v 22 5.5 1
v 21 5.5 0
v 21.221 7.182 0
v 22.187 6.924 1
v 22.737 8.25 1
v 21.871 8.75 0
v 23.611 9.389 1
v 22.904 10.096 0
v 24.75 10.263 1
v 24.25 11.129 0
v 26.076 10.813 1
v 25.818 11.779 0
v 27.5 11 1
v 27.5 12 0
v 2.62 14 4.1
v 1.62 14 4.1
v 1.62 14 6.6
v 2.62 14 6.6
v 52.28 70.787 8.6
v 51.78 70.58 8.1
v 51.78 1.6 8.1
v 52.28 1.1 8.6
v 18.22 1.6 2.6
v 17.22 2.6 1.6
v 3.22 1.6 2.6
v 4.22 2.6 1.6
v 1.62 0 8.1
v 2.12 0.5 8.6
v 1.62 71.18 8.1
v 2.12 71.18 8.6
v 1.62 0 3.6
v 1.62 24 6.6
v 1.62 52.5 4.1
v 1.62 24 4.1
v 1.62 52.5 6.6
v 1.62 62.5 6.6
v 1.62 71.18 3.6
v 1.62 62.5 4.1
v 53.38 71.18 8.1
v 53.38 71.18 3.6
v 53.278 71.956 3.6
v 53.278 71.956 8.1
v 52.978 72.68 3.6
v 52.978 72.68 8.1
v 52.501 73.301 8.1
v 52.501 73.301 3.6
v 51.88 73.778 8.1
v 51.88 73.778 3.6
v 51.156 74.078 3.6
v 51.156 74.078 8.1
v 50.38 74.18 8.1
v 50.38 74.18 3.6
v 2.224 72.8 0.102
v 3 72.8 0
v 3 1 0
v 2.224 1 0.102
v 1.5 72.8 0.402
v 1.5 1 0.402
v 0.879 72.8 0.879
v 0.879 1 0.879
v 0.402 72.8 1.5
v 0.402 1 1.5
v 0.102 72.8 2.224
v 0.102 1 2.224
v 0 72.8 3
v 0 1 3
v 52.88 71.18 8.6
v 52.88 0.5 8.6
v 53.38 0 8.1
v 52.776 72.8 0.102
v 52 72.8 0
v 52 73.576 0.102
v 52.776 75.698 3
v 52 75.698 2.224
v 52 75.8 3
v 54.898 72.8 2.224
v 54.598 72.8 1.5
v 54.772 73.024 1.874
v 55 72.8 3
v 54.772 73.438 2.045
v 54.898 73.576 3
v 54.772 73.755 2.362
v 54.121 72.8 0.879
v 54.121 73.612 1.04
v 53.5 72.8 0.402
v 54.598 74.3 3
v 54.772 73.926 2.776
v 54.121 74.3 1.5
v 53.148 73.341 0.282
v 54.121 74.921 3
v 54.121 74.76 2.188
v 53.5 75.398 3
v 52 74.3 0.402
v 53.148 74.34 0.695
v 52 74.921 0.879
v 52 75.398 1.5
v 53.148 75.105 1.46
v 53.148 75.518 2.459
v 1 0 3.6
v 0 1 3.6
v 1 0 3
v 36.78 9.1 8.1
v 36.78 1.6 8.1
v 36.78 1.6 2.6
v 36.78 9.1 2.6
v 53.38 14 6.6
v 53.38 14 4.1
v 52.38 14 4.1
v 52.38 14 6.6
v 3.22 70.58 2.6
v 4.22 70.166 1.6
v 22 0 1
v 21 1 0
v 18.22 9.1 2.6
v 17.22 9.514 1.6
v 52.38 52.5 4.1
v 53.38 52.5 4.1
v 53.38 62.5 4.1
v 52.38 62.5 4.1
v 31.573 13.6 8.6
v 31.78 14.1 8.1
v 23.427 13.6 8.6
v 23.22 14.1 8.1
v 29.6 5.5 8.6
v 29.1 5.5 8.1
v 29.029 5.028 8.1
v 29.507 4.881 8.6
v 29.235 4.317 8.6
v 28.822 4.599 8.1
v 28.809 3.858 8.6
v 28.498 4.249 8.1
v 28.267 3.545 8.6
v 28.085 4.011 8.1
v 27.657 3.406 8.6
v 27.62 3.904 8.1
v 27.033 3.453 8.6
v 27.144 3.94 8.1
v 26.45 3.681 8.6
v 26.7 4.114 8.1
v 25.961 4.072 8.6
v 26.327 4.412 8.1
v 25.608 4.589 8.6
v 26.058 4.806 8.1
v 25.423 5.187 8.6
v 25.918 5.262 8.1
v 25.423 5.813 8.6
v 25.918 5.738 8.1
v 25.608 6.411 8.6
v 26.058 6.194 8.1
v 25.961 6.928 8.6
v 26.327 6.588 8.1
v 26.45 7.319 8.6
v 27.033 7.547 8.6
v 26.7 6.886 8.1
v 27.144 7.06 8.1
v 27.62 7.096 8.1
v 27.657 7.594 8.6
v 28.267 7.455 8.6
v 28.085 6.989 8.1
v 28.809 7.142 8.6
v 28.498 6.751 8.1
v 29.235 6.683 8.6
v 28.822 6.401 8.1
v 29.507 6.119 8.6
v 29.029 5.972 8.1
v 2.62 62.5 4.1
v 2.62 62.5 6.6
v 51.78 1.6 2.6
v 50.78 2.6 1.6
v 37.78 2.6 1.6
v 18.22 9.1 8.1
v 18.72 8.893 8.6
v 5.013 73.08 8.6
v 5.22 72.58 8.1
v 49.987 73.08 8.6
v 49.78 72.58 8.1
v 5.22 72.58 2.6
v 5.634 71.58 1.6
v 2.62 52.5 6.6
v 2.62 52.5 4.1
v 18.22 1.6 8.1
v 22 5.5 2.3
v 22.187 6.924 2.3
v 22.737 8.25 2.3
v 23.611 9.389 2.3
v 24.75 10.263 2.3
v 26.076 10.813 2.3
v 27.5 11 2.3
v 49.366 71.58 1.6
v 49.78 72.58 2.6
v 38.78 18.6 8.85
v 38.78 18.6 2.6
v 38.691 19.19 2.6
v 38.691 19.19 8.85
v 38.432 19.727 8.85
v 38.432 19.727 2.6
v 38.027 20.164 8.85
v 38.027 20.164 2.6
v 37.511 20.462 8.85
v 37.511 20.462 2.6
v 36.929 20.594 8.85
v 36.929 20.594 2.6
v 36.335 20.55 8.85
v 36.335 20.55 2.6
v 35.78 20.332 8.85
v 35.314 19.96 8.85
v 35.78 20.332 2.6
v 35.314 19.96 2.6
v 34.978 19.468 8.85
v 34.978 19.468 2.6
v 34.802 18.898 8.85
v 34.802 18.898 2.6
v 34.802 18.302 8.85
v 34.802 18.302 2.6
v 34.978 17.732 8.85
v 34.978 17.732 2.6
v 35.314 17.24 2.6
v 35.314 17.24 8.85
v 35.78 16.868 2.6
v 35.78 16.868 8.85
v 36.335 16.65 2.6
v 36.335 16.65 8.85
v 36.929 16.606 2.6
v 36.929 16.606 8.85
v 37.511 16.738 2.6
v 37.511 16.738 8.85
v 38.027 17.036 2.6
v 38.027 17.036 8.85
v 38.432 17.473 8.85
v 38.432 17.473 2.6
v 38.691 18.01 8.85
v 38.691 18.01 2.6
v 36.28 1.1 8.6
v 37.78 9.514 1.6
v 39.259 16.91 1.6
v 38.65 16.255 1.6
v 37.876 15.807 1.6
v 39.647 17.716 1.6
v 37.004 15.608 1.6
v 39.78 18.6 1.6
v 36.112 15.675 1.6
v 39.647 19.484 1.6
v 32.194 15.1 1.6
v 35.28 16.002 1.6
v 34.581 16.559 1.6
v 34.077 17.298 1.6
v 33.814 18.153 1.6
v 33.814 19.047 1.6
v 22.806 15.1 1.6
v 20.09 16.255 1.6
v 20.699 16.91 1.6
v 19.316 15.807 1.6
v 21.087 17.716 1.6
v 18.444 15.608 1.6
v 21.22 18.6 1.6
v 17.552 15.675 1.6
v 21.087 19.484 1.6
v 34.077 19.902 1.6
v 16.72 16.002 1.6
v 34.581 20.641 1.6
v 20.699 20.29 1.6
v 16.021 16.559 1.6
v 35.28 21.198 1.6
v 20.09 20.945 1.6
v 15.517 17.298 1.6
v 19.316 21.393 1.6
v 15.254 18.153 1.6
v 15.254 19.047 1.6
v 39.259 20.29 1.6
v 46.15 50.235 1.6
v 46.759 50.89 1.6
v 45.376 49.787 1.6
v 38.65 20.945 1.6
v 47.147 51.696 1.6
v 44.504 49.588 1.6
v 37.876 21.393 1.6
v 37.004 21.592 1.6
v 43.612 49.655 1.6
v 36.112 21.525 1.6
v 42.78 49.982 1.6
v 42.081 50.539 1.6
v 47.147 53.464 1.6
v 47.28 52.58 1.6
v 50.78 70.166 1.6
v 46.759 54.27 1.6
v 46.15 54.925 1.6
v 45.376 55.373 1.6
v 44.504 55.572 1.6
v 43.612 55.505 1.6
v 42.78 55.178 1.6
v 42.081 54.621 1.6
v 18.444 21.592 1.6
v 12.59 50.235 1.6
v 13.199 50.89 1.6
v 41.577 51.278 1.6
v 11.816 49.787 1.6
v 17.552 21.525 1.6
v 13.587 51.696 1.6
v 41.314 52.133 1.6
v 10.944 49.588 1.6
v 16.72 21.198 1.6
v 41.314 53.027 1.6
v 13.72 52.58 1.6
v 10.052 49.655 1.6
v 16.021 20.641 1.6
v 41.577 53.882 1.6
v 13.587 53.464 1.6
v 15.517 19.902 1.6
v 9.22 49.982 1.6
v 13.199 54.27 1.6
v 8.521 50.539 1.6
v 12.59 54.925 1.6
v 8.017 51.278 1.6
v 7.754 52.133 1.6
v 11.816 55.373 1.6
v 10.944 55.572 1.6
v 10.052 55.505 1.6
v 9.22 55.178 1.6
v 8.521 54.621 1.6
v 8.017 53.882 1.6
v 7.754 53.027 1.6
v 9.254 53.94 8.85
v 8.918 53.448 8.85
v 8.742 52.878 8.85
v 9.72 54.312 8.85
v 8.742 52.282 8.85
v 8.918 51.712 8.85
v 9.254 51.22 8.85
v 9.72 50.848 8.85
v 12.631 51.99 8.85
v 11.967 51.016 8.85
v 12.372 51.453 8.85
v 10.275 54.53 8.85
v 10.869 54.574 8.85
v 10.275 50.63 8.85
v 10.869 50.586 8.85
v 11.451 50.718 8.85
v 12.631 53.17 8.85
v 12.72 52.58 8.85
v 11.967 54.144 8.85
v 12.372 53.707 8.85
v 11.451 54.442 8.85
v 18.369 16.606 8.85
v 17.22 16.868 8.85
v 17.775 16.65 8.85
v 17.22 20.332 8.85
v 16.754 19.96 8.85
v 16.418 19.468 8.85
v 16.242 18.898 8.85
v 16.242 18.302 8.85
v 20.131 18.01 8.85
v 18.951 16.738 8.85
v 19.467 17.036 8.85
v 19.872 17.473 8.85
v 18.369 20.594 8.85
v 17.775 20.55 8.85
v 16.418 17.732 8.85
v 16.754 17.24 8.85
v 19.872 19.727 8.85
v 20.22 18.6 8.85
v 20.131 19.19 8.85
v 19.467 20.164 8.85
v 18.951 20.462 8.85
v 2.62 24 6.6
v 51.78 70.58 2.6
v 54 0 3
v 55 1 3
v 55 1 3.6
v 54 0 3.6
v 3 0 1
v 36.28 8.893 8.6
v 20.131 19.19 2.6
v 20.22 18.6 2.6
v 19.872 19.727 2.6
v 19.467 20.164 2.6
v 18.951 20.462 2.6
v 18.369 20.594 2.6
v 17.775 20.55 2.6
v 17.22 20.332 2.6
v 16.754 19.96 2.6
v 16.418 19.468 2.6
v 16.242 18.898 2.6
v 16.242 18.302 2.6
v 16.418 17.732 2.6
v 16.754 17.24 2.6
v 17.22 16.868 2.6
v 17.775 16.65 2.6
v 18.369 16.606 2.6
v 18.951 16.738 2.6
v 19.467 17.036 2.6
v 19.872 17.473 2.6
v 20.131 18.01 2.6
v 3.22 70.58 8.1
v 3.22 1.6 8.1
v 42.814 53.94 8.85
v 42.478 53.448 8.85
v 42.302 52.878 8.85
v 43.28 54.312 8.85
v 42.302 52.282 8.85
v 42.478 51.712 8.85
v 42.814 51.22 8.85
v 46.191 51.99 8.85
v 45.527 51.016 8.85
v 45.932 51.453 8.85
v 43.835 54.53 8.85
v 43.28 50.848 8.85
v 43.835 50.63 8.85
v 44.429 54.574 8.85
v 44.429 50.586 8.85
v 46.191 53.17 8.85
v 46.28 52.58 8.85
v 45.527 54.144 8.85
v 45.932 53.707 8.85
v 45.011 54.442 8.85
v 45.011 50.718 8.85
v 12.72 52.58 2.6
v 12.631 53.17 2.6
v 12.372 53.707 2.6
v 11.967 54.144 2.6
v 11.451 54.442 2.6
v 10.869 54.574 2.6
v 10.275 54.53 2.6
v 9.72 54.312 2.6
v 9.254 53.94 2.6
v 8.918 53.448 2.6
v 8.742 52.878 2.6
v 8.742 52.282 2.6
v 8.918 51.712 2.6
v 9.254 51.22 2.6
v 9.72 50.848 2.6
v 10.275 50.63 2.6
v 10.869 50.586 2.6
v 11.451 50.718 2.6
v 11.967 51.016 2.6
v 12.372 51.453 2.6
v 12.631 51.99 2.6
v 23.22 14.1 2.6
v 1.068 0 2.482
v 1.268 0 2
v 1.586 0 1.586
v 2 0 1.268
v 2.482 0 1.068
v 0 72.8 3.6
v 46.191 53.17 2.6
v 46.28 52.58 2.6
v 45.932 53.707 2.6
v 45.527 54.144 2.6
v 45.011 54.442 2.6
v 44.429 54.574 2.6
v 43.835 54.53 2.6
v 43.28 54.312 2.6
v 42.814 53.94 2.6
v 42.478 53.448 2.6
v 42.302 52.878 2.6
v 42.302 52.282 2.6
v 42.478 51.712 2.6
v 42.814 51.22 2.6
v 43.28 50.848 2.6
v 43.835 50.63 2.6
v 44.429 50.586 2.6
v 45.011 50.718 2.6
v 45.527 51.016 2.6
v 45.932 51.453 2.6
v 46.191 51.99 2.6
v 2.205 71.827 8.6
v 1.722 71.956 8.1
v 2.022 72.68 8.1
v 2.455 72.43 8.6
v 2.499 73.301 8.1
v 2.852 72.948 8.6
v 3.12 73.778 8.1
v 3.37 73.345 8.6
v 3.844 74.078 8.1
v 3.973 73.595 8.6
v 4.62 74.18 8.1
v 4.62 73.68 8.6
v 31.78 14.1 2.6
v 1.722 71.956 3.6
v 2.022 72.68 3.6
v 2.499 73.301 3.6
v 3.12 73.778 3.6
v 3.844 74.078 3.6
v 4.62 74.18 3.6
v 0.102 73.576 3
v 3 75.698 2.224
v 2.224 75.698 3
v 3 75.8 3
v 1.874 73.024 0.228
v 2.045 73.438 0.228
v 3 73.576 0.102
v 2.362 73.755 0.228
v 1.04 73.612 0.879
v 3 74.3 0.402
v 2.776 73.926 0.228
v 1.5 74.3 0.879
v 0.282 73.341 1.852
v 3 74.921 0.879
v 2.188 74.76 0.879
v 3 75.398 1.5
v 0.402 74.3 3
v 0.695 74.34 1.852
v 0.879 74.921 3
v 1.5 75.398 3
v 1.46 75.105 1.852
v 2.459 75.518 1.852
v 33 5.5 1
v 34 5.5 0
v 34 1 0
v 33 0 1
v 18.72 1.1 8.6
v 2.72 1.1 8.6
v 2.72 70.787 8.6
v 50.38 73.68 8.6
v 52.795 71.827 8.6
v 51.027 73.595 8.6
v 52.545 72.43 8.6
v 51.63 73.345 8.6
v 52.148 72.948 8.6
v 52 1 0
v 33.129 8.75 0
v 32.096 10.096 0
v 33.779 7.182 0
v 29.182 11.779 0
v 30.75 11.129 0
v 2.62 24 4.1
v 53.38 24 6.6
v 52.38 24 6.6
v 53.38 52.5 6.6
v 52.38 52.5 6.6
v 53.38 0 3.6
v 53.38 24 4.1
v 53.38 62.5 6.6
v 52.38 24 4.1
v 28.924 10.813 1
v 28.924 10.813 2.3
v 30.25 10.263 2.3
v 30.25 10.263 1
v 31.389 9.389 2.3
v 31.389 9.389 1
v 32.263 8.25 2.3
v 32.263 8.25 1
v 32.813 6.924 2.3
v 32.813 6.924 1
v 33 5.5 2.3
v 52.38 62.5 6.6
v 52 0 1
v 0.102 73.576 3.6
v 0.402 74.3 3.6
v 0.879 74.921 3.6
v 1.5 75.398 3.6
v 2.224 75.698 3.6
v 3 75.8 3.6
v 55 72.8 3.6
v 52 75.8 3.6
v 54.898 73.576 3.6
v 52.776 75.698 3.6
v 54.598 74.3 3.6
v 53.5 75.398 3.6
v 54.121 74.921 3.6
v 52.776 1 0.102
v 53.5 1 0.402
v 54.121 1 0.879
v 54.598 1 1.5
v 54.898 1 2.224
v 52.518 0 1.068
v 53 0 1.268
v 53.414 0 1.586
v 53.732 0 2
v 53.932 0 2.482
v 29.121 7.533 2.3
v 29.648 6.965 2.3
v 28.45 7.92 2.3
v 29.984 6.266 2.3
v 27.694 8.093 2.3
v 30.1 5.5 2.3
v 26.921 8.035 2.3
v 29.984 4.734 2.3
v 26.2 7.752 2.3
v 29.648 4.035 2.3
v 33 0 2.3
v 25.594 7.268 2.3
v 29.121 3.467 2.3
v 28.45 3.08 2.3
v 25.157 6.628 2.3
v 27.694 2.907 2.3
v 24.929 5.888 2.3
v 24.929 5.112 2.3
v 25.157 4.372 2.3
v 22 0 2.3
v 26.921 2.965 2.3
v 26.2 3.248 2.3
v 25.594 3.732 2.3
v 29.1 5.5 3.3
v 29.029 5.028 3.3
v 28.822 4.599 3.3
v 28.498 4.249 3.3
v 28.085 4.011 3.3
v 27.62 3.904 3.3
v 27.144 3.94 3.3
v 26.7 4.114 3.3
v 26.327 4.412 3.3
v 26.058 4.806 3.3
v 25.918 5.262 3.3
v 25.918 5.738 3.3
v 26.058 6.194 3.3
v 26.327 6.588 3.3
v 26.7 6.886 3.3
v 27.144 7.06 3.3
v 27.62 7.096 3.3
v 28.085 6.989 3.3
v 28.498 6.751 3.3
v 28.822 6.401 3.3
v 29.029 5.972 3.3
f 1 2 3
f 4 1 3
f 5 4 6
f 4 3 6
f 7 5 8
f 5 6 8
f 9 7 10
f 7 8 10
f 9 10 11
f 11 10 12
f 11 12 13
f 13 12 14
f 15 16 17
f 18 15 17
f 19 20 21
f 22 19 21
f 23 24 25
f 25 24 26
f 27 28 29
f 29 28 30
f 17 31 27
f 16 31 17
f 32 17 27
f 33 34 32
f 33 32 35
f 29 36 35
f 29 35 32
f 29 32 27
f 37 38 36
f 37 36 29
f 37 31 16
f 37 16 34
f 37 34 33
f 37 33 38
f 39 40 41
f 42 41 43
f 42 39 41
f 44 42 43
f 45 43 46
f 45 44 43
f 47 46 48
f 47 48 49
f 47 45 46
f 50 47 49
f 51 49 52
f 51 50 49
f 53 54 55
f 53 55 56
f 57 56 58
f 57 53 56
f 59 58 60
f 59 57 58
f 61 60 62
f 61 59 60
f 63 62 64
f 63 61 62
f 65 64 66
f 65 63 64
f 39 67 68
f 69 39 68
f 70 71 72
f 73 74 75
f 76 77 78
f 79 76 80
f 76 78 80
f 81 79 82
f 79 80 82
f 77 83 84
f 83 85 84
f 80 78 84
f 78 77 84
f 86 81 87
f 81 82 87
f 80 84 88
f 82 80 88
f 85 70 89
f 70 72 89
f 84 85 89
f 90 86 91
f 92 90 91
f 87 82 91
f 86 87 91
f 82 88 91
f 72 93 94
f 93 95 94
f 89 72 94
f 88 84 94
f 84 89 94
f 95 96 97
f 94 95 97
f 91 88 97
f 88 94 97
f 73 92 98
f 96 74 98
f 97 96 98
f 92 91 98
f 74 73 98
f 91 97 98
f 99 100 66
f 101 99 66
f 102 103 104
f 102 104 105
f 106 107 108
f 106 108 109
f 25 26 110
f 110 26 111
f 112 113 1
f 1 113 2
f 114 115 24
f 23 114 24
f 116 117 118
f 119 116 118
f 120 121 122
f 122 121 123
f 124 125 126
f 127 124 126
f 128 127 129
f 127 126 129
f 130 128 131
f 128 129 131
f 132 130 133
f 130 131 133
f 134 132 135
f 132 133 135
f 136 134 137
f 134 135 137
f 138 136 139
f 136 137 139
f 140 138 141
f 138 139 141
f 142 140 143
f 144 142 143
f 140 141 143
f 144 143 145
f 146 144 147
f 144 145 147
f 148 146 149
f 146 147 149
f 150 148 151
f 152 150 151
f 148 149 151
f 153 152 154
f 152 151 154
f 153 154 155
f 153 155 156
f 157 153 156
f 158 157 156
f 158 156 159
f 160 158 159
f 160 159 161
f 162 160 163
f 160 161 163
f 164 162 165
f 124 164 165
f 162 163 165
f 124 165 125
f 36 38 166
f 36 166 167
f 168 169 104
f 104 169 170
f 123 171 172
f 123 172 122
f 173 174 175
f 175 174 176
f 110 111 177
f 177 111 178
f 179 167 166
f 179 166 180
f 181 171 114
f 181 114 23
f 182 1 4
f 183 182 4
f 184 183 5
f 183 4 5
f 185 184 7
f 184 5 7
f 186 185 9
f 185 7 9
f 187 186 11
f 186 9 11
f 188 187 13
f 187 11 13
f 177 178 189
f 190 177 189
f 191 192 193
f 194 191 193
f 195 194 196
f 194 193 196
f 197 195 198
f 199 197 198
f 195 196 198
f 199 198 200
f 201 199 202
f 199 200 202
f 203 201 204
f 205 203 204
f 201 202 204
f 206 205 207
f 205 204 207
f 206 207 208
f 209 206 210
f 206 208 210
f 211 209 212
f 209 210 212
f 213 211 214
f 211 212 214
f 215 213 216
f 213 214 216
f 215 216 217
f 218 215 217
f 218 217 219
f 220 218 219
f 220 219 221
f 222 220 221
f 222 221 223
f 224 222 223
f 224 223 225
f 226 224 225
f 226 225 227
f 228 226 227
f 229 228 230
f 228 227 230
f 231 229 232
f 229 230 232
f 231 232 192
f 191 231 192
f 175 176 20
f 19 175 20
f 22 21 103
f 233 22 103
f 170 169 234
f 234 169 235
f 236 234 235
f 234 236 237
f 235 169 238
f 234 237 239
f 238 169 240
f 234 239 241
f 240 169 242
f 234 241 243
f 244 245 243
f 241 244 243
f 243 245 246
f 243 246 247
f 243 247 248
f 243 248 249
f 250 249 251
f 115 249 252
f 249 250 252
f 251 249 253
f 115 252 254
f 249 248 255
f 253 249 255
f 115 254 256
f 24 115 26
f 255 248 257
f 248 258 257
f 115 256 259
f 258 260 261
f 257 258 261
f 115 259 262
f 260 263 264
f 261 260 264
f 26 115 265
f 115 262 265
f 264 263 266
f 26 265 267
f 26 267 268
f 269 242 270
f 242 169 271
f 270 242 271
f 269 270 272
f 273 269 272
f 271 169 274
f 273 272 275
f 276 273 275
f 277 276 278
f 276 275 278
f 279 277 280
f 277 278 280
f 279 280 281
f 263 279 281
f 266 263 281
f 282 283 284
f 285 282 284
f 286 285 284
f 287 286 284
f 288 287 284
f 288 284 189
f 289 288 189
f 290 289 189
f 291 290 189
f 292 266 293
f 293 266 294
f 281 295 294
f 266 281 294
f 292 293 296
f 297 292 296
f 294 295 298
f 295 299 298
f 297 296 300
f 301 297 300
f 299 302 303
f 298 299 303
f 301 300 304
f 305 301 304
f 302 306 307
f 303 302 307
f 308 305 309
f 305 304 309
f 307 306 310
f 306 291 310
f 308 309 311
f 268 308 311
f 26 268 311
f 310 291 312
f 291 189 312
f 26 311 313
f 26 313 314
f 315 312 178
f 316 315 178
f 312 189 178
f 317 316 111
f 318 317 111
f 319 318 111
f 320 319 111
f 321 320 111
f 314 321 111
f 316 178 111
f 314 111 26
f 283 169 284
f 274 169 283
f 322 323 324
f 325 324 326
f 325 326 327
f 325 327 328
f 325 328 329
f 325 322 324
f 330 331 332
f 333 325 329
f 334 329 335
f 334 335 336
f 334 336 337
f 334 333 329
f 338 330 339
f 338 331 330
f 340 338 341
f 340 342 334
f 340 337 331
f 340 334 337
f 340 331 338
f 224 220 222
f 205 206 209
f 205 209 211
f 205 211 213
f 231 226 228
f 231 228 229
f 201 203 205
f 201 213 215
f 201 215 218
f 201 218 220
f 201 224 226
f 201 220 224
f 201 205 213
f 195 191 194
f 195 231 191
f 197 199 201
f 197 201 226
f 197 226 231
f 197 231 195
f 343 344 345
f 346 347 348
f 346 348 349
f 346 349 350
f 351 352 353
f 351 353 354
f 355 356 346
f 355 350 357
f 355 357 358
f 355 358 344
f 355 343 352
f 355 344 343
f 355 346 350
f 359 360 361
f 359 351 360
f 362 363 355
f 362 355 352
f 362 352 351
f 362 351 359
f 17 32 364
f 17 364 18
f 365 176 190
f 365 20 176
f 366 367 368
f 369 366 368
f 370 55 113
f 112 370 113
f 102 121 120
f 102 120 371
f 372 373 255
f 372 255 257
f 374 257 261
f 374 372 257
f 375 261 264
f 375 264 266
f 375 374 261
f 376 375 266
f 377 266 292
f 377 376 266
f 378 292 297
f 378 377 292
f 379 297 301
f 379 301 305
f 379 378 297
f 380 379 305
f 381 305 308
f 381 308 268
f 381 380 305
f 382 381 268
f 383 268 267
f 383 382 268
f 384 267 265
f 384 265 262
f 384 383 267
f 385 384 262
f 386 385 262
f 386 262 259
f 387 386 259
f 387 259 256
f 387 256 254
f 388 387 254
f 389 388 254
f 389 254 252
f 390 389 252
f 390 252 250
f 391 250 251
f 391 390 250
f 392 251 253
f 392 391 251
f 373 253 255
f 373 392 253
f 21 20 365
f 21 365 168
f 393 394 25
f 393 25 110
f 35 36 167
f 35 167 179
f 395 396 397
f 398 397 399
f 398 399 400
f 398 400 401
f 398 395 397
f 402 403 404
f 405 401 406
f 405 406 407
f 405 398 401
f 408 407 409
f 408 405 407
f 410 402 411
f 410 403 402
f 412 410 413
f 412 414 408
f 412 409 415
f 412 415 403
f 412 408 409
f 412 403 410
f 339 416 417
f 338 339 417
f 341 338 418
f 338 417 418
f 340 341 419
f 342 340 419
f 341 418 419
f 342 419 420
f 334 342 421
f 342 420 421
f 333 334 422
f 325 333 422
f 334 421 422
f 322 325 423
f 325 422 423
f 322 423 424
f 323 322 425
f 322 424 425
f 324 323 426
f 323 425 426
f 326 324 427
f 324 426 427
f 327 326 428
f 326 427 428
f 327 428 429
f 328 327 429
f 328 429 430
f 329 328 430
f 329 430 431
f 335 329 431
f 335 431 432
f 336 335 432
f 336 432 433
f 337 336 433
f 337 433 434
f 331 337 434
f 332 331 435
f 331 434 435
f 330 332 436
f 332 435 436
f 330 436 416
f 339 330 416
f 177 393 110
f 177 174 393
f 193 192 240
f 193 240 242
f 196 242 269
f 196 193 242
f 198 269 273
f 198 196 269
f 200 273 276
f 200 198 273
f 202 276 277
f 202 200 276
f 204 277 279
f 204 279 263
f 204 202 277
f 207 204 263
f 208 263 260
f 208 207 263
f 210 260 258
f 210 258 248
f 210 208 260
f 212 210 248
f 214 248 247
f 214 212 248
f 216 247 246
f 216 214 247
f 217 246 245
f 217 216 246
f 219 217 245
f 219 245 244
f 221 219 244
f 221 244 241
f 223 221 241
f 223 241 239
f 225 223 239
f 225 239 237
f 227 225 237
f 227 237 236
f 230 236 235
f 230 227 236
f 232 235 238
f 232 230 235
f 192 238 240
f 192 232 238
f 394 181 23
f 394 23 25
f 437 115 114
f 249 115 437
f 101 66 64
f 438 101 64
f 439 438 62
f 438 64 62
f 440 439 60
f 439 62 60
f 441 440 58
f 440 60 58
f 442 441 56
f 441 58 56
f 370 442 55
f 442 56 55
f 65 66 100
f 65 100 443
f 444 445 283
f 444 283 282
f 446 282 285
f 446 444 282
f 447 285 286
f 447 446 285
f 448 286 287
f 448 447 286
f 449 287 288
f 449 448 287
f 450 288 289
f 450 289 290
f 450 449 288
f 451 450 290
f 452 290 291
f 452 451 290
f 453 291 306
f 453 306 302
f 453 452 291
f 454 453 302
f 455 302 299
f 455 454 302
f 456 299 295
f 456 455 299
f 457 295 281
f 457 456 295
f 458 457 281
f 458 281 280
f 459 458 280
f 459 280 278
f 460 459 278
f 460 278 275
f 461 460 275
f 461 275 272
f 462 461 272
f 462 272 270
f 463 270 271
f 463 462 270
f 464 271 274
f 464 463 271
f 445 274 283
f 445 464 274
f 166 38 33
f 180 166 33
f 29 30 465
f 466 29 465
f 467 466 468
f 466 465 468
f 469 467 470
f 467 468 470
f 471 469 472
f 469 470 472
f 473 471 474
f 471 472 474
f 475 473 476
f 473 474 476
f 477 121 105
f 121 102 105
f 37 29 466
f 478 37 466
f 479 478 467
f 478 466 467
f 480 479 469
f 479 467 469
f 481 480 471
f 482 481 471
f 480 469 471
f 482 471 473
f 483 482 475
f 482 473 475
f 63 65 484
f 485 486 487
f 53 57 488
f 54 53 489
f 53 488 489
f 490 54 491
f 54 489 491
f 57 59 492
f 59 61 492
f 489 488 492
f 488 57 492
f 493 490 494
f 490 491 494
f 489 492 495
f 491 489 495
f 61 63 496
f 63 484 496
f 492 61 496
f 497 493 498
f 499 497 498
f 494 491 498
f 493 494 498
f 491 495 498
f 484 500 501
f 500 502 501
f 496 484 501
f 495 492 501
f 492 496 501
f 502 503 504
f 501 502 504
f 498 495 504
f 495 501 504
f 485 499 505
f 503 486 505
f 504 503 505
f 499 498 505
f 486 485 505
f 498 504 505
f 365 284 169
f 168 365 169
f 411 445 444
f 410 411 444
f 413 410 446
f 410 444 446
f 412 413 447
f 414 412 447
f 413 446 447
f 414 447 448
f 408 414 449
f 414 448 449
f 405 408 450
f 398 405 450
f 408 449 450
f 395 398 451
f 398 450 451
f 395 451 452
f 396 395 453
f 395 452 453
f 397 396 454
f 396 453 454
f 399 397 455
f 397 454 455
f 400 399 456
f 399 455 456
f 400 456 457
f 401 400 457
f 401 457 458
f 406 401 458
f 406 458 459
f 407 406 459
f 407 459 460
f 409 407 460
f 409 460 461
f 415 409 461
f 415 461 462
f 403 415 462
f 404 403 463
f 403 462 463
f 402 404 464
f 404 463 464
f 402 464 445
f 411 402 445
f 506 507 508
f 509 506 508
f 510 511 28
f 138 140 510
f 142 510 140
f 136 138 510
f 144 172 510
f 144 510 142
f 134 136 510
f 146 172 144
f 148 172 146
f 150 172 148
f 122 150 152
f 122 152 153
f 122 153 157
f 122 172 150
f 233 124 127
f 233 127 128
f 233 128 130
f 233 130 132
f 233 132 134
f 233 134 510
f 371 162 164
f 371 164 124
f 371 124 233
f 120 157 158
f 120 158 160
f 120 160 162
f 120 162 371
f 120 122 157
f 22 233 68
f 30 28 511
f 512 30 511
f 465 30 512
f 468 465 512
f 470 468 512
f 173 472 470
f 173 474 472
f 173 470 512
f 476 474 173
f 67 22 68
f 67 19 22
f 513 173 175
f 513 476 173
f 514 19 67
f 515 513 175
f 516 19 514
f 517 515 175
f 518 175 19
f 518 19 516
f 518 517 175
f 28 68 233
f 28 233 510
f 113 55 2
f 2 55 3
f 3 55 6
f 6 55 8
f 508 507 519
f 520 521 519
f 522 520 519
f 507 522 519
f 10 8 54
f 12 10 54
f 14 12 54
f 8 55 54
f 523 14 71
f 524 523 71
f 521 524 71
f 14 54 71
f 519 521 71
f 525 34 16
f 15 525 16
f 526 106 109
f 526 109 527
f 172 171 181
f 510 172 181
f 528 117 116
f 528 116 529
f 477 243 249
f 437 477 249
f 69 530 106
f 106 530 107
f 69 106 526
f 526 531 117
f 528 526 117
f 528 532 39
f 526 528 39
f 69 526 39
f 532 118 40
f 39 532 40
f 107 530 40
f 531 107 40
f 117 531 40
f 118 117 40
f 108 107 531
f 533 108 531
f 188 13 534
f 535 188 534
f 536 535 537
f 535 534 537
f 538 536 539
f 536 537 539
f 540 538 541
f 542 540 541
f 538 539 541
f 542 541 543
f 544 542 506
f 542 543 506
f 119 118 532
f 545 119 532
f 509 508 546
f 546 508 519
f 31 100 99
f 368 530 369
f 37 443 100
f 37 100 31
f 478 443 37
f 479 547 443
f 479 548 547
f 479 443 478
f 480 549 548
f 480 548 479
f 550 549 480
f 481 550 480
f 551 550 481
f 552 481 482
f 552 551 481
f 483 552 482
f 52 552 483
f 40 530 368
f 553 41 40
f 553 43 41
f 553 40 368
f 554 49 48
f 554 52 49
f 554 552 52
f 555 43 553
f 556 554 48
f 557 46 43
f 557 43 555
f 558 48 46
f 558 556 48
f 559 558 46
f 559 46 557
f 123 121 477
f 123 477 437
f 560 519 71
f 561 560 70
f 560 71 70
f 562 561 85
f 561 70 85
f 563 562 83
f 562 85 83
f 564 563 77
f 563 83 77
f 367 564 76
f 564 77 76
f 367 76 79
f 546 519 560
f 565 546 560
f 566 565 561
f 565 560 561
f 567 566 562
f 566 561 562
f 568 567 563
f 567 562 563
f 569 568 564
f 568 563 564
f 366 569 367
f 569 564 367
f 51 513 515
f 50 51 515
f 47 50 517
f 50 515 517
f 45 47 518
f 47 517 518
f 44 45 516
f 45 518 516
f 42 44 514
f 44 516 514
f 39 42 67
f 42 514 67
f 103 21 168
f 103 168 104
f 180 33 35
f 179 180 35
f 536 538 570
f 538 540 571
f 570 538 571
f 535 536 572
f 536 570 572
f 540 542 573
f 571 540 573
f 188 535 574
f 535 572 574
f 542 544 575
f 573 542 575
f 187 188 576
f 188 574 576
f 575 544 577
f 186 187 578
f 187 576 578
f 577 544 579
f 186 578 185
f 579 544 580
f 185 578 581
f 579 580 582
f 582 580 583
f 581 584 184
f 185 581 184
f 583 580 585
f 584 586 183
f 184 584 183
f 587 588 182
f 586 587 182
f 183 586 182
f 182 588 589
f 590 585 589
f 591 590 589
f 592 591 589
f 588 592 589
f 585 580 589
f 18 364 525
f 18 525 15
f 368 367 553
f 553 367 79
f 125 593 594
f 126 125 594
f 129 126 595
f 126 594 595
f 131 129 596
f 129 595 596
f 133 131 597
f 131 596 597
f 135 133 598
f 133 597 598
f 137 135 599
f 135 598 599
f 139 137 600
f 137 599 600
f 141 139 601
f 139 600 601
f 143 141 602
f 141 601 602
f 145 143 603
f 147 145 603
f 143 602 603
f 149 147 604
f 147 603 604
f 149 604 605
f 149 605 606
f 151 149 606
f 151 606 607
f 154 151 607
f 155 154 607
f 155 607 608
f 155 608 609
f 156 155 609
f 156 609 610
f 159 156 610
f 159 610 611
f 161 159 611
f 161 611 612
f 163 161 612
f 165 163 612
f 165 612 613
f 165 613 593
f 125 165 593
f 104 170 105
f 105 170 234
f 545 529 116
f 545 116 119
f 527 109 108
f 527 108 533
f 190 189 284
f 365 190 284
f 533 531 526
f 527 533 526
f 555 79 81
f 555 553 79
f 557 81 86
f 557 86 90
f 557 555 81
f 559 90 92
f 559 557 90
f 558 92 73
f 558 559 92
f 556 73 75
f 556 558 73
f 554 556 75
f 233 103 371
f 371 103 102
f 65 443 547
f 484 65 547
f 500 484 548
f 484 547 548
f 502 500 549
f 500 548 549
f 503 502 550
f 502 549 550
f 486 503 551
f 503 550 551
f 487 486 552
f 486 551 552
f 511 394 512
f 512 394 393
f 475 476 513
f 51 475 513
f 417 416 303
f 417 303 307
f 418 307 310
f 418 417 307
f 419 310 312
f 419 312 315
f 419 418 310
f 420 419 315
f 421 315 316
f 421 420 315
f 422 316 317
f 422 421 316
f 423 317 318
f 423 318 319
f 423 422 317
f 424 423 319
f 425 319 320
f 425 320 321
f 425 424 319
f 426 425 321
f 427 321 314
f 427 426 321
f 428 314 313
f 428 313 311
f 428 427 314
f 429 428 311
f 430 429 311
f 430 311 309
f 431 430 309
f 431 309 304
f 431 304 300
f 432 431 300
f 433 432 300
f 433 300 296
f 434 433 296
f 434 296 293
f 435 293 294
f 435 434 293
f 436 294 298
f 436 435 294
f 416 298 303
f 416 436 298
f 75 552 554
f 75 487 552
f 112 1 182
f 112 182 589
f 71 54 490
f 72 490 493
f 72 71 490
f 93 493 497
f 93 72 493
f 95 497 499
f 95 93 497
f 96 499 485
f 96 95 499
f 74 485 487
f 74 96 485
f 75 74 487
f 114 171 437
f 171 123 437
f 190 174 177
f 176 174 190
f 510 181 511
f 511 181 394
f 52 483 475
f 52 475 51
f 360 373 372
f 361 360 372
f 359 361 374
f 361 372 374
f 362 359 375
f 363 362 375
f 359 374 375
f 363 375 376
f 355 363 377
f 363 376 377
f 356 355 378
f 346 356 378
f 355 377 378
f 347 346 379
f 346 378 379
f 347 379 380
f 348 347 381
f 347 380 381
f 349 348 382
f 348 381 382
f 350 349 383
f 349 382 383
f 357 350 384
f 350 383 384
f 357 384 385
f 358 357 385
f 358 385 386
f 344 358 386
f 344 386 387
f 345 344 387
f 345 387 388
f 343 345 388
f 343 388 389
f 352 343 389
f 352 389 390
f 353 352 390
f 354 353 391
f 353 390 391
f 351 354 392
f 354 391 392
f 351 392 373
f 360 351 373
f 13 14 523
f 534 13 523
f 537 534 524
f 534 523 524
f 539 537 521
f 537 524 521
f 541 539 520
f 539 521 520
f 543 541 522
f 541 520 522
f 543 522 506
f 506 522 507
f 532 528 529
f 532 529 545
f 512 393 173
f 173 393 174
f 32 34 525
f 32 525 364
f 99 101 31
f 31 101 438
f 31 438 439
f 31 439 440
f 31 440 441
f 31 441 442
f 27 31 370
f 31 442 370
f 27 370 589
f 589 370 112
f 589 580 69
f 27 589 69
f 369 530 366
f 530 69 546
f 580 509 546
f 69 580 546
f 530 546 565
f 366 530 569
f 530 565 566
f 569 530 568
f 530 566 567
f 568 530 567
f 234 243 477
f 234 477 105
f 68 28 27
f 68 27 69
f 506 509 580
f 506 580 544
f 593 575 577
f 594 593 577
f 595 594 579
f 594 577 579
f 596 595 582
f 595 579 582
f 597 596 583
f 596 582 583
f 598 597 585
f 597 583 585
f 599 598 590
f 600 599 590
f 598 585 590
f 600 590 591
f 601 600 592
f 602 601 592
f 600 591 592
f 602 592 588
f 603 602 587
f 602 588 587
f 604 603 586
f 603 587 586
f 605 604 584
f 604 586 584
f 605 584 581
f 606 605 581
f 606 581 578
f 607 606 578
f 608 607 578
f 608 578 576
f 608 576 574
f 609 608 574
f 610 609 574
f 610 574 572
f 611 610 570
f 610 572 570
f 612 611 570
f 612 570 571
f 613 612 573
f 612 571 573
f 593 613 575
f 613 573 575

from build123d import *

# Parameters (mm, degrees)
SKETCH_W        = 55
SKETCH_H        = 75.8
PAD_DEPTH       = 3.6
SKETCH001_W     = 51.76
SKETCH001_H     = 74.18
PAD001_DEPTH    = 5
POCKET_DEPTH    = 7
SKETCH003_R     = 2
PAD002_DEPTH    = 7.25
SKETCH004_W     = 10
SKETCH004_H     = 2.5
POCKET001_DEPTH = 1
SKETCH005_W     = 10
SKETCH005_H     = 2.5
POCKET002_DEPTH = 1
POCKET003_DEPTH = 2.3
SKETCH007_R     = 1.6
POCKET004_DEPTH = 6.551
CHAMFER_SIZE    = 5
CHAMFER001_SIZE = 2
CHAMFER002_SIZE = 1
CHAMFER003_SIZE = 1
CHAMFER004_SIZE = 1
FILLET_R        = 3
CHAMFER005_SIZE = 0.5
CHAMFER006_SIZE = 1


with BuildPart() as part:
    # Sketch → Pad (new body)
    with BuildSketch(Plane.XY):
        with Locations((27.5, 37.9)):
            Rectangle(SKETCH_W, SKETCH_H)
    extrude(amount=PAD_DEPTH)

    # Sketch001 → Pad001 (new body)
    with BuildSketch(Plane.XY.offset(3.6)):
        with Locations((27.5, 37.09)):
            Rectangle(SKETCH001_W, SKETCH001_H)
    extrude(amount=PAD001_DEPTH)

    # Sketch002 → Pocket (cut)
    with BuildSketch(Plane.XY.offset(8.6)):
        Polygon((18.22, 1.6), (3.22, 1.6), (3.22, 72.58), (51.78, 72.58), (51.78, 1.6), (36.78, 1.6), (36.78, 14.1), (18.22, 14.1), align=None)
    extrude(amount=-POCKET_DEPTH, mode=Mode.SUBTRACT)

    # Sketch003 → Pad002 (new body)
    with BuildSketch(Plane.XY.offset(1.6)):
        with Locations((10.72, 52.58)):
            Circle(SKETCH003_R)
        with Locations((44.28, 52.58)):
            Circle(SKETCH003_R)
        with Locations((18.22, 18.6)):
            Circle(SKETCH003_R)
        with Locations((36.78, 18.6)):
            Circle(SKETCH003_R)
    extrude(amount=PAD002_DEPTH)

    # Sketch004 → Pocket001 (cut)
    with BuildSketch(Plane.YZ.offset(53.38)):
        with Locations((19, 5.35)):
            Rectangle(SKETCH004_W, SKETCH004_H)
        with Locations((57.5, 5.35)):
            Rectangle(SKETCH004_W, SKETCH004_H)
    extrude(amount=-POCKET001_DEPTH, mode=Mode.SUBTRACT)

    # Sketch005 → Pocket002 (cut)
    with BuildSketch(Plane(origin=(1.62, 0, 0), x_dir=(0, -1, 0), z_dir=(-1, 0, 0))):
        with Locations((-57.5, 5.35)):
            Rectangle(SKETCH005_W, SKETCH005_H)
        with Locations((-19, 5.35)):
            Rectangle(SKETCH005_W, SKETCH005_H)
    extrude(amount=-POCKET002_DEPTH, mode=Mode.SUBTRACT)

    # Sketch006 → Pocket003 (cut)
    with BuildSketch(Plane(origin=(0, 0, 0), x_dir=(1, 0, 0), z_dir=(0, 0, -1))):
        with BuildLine():
            Line((22, 0), (33, 0))
            Line((33, 0), (33, -5.500002))
            ThreePointArc((27.500001, -11), (31.389087, -9.389088), (33, -5.500002))
            Line((27.500001, -11), (27.499999, -11))
            ThreePointArc((22, -5.500002), (23.610913, -9.389088), (27.499999, -11))
            Line((22, -5.500002), (22, 0))
        make_face()
    extrude(amount=-POCKET003_DEPTH, mode=Mode.SUBTRACT)

    # Sketch007 → Pocket004 (cut, through all)
    with BuildSketch(Plane(origin=(0, 0, 2.3), x_dir=(1, 0, 0), z_dir=(0, 0, -1))):
        with Locations((27.5, -5.5)):
            Circle(SKETCH007_R)
    extrude(amount=-POCKET004_DEPTH, mode=Mode.SUBTRACT)

    # Chamfer
    chamfer_edges = [part.edges().sort_by_distance(p)[0] for p in [
        (18.22, 14.1, 5.1),
        (36.78, 14.1, 5.1),
    ]]
    chamfer(chamfer_edges, length=CHAMFER_SIZE)

    # Chamfer001
    chamfer001_edges = [part.edges().sort_by_distance(p)[0] for p in [
        (3.22, 72.58, 5.1),
        (51.78, 72.58, 5.1),
    ]]
    chamfer(chamfer001_edges, length=CHAMFER001_SIZE)

    # Chamfer002
    chamfer002_edges = [part.edges().sort_by_distance(p)[0] for p in [
        (3.22, 36.09, 1.6),
        (4.22, 71.58, 1.6),
        (10.72, 1.6, 1.6),
        (27.5, 72.58, 1.6),
        (18.22, 5.35, 1.6),
        (50.78, 71.58, 1.6),
        (20.72, 11.6, 1.6),
        (51.78, 36.09, 1.6),
        (27.5, 14.1, 1.6),
        (44.28, 1.6, 1.6),
        (34.28, 11.6, 1.6),
        (36.78, 5.35, 1.6),
        (8.72, 52.58, 1.6),
        (42.28, 52.58, 1.6),
        (34.78, 18.6, 1.6),
        (16.22, 18.6, 1.6),
    ]]
    chamfer(chamfer002_edges, length=CHAMFER002_SIZE)

    # Chamfer003
    chamfer003_edges = [part.edges().sort_by_distance(p)[0] for p in [
        (25.9, 5.5, 2.3),
    ]]
    chamfer(chamfer003_edges, length=CHAMFER003_SIZE)

    # Chamfer004
    chamfer004_edges = [part.edges().sort_by_distance(p)[0] for p in [
        (23.610913, 9.389088, 0),
        (31.389087, 9.389088, 0),
    ]]
    chamfer(chamfer004_edges, length=CHAMFER004_SIZE)

    # Fillet
    fillet_edges = [part.edges().sort_by_distance(p)[0] for p in [
        (1.62, 74.18, 6.1),
        (0, 75.8, 1.8),
        (0, 37.9, 0),
        (27.5, 75.8, 0),
        (53.38, 74.18, 6.1),
        (55, 37.9, 0),
        (55, 75.8, 1.8),
    ]]
    fillet(fillet_edges, radius=FILLET_R)

    # Chamfer005
    chamfer005_edges = [part.edges().sort_by_distance(p)[0] for p in [
        (1.62, 35.59, 8.6),
        (2.49868, 73.30132, 8.6),
        (27.5, 0, 8.6),
        (27.5, 74.18, 8.6),
        (53.38, 35.59, 8.6),
        (52.50132, 73.30132, 8.6),
        (51.78, 36.09, 8.6),
        (50.78, 71.58, 8.6),
        (44.28, 1.6, 8.6),
        (27.5, 72.58, 8.6),
        (36.78, 5.35, 8.6),
        (4.22, 71.58, 8.6),
        (34.28, 11.6, 8.6),
        (3.22, 36.09, 8.6),
        (27.5, 14.1, 8.6),
        (10.72, 1.6, 8.6),
        (20.72, 11.6, 8.6),
        (18.22, 5.35, 8.6),
        (25.9, 5.5, 8.6),
    ]]
    chamfer(chamfer005_edges, length=CHAMFER005_SIZE)

    # Chamfer006
    chamfer006_edges = [part.edges().sort_by_distance(p)[0] for p in [
        (43, 0, 0),
        (12, 0, 0),
    ]]
    chamfer(chamfer006_edges, length=CHAMFER006_SIZE)


solid = part.part
